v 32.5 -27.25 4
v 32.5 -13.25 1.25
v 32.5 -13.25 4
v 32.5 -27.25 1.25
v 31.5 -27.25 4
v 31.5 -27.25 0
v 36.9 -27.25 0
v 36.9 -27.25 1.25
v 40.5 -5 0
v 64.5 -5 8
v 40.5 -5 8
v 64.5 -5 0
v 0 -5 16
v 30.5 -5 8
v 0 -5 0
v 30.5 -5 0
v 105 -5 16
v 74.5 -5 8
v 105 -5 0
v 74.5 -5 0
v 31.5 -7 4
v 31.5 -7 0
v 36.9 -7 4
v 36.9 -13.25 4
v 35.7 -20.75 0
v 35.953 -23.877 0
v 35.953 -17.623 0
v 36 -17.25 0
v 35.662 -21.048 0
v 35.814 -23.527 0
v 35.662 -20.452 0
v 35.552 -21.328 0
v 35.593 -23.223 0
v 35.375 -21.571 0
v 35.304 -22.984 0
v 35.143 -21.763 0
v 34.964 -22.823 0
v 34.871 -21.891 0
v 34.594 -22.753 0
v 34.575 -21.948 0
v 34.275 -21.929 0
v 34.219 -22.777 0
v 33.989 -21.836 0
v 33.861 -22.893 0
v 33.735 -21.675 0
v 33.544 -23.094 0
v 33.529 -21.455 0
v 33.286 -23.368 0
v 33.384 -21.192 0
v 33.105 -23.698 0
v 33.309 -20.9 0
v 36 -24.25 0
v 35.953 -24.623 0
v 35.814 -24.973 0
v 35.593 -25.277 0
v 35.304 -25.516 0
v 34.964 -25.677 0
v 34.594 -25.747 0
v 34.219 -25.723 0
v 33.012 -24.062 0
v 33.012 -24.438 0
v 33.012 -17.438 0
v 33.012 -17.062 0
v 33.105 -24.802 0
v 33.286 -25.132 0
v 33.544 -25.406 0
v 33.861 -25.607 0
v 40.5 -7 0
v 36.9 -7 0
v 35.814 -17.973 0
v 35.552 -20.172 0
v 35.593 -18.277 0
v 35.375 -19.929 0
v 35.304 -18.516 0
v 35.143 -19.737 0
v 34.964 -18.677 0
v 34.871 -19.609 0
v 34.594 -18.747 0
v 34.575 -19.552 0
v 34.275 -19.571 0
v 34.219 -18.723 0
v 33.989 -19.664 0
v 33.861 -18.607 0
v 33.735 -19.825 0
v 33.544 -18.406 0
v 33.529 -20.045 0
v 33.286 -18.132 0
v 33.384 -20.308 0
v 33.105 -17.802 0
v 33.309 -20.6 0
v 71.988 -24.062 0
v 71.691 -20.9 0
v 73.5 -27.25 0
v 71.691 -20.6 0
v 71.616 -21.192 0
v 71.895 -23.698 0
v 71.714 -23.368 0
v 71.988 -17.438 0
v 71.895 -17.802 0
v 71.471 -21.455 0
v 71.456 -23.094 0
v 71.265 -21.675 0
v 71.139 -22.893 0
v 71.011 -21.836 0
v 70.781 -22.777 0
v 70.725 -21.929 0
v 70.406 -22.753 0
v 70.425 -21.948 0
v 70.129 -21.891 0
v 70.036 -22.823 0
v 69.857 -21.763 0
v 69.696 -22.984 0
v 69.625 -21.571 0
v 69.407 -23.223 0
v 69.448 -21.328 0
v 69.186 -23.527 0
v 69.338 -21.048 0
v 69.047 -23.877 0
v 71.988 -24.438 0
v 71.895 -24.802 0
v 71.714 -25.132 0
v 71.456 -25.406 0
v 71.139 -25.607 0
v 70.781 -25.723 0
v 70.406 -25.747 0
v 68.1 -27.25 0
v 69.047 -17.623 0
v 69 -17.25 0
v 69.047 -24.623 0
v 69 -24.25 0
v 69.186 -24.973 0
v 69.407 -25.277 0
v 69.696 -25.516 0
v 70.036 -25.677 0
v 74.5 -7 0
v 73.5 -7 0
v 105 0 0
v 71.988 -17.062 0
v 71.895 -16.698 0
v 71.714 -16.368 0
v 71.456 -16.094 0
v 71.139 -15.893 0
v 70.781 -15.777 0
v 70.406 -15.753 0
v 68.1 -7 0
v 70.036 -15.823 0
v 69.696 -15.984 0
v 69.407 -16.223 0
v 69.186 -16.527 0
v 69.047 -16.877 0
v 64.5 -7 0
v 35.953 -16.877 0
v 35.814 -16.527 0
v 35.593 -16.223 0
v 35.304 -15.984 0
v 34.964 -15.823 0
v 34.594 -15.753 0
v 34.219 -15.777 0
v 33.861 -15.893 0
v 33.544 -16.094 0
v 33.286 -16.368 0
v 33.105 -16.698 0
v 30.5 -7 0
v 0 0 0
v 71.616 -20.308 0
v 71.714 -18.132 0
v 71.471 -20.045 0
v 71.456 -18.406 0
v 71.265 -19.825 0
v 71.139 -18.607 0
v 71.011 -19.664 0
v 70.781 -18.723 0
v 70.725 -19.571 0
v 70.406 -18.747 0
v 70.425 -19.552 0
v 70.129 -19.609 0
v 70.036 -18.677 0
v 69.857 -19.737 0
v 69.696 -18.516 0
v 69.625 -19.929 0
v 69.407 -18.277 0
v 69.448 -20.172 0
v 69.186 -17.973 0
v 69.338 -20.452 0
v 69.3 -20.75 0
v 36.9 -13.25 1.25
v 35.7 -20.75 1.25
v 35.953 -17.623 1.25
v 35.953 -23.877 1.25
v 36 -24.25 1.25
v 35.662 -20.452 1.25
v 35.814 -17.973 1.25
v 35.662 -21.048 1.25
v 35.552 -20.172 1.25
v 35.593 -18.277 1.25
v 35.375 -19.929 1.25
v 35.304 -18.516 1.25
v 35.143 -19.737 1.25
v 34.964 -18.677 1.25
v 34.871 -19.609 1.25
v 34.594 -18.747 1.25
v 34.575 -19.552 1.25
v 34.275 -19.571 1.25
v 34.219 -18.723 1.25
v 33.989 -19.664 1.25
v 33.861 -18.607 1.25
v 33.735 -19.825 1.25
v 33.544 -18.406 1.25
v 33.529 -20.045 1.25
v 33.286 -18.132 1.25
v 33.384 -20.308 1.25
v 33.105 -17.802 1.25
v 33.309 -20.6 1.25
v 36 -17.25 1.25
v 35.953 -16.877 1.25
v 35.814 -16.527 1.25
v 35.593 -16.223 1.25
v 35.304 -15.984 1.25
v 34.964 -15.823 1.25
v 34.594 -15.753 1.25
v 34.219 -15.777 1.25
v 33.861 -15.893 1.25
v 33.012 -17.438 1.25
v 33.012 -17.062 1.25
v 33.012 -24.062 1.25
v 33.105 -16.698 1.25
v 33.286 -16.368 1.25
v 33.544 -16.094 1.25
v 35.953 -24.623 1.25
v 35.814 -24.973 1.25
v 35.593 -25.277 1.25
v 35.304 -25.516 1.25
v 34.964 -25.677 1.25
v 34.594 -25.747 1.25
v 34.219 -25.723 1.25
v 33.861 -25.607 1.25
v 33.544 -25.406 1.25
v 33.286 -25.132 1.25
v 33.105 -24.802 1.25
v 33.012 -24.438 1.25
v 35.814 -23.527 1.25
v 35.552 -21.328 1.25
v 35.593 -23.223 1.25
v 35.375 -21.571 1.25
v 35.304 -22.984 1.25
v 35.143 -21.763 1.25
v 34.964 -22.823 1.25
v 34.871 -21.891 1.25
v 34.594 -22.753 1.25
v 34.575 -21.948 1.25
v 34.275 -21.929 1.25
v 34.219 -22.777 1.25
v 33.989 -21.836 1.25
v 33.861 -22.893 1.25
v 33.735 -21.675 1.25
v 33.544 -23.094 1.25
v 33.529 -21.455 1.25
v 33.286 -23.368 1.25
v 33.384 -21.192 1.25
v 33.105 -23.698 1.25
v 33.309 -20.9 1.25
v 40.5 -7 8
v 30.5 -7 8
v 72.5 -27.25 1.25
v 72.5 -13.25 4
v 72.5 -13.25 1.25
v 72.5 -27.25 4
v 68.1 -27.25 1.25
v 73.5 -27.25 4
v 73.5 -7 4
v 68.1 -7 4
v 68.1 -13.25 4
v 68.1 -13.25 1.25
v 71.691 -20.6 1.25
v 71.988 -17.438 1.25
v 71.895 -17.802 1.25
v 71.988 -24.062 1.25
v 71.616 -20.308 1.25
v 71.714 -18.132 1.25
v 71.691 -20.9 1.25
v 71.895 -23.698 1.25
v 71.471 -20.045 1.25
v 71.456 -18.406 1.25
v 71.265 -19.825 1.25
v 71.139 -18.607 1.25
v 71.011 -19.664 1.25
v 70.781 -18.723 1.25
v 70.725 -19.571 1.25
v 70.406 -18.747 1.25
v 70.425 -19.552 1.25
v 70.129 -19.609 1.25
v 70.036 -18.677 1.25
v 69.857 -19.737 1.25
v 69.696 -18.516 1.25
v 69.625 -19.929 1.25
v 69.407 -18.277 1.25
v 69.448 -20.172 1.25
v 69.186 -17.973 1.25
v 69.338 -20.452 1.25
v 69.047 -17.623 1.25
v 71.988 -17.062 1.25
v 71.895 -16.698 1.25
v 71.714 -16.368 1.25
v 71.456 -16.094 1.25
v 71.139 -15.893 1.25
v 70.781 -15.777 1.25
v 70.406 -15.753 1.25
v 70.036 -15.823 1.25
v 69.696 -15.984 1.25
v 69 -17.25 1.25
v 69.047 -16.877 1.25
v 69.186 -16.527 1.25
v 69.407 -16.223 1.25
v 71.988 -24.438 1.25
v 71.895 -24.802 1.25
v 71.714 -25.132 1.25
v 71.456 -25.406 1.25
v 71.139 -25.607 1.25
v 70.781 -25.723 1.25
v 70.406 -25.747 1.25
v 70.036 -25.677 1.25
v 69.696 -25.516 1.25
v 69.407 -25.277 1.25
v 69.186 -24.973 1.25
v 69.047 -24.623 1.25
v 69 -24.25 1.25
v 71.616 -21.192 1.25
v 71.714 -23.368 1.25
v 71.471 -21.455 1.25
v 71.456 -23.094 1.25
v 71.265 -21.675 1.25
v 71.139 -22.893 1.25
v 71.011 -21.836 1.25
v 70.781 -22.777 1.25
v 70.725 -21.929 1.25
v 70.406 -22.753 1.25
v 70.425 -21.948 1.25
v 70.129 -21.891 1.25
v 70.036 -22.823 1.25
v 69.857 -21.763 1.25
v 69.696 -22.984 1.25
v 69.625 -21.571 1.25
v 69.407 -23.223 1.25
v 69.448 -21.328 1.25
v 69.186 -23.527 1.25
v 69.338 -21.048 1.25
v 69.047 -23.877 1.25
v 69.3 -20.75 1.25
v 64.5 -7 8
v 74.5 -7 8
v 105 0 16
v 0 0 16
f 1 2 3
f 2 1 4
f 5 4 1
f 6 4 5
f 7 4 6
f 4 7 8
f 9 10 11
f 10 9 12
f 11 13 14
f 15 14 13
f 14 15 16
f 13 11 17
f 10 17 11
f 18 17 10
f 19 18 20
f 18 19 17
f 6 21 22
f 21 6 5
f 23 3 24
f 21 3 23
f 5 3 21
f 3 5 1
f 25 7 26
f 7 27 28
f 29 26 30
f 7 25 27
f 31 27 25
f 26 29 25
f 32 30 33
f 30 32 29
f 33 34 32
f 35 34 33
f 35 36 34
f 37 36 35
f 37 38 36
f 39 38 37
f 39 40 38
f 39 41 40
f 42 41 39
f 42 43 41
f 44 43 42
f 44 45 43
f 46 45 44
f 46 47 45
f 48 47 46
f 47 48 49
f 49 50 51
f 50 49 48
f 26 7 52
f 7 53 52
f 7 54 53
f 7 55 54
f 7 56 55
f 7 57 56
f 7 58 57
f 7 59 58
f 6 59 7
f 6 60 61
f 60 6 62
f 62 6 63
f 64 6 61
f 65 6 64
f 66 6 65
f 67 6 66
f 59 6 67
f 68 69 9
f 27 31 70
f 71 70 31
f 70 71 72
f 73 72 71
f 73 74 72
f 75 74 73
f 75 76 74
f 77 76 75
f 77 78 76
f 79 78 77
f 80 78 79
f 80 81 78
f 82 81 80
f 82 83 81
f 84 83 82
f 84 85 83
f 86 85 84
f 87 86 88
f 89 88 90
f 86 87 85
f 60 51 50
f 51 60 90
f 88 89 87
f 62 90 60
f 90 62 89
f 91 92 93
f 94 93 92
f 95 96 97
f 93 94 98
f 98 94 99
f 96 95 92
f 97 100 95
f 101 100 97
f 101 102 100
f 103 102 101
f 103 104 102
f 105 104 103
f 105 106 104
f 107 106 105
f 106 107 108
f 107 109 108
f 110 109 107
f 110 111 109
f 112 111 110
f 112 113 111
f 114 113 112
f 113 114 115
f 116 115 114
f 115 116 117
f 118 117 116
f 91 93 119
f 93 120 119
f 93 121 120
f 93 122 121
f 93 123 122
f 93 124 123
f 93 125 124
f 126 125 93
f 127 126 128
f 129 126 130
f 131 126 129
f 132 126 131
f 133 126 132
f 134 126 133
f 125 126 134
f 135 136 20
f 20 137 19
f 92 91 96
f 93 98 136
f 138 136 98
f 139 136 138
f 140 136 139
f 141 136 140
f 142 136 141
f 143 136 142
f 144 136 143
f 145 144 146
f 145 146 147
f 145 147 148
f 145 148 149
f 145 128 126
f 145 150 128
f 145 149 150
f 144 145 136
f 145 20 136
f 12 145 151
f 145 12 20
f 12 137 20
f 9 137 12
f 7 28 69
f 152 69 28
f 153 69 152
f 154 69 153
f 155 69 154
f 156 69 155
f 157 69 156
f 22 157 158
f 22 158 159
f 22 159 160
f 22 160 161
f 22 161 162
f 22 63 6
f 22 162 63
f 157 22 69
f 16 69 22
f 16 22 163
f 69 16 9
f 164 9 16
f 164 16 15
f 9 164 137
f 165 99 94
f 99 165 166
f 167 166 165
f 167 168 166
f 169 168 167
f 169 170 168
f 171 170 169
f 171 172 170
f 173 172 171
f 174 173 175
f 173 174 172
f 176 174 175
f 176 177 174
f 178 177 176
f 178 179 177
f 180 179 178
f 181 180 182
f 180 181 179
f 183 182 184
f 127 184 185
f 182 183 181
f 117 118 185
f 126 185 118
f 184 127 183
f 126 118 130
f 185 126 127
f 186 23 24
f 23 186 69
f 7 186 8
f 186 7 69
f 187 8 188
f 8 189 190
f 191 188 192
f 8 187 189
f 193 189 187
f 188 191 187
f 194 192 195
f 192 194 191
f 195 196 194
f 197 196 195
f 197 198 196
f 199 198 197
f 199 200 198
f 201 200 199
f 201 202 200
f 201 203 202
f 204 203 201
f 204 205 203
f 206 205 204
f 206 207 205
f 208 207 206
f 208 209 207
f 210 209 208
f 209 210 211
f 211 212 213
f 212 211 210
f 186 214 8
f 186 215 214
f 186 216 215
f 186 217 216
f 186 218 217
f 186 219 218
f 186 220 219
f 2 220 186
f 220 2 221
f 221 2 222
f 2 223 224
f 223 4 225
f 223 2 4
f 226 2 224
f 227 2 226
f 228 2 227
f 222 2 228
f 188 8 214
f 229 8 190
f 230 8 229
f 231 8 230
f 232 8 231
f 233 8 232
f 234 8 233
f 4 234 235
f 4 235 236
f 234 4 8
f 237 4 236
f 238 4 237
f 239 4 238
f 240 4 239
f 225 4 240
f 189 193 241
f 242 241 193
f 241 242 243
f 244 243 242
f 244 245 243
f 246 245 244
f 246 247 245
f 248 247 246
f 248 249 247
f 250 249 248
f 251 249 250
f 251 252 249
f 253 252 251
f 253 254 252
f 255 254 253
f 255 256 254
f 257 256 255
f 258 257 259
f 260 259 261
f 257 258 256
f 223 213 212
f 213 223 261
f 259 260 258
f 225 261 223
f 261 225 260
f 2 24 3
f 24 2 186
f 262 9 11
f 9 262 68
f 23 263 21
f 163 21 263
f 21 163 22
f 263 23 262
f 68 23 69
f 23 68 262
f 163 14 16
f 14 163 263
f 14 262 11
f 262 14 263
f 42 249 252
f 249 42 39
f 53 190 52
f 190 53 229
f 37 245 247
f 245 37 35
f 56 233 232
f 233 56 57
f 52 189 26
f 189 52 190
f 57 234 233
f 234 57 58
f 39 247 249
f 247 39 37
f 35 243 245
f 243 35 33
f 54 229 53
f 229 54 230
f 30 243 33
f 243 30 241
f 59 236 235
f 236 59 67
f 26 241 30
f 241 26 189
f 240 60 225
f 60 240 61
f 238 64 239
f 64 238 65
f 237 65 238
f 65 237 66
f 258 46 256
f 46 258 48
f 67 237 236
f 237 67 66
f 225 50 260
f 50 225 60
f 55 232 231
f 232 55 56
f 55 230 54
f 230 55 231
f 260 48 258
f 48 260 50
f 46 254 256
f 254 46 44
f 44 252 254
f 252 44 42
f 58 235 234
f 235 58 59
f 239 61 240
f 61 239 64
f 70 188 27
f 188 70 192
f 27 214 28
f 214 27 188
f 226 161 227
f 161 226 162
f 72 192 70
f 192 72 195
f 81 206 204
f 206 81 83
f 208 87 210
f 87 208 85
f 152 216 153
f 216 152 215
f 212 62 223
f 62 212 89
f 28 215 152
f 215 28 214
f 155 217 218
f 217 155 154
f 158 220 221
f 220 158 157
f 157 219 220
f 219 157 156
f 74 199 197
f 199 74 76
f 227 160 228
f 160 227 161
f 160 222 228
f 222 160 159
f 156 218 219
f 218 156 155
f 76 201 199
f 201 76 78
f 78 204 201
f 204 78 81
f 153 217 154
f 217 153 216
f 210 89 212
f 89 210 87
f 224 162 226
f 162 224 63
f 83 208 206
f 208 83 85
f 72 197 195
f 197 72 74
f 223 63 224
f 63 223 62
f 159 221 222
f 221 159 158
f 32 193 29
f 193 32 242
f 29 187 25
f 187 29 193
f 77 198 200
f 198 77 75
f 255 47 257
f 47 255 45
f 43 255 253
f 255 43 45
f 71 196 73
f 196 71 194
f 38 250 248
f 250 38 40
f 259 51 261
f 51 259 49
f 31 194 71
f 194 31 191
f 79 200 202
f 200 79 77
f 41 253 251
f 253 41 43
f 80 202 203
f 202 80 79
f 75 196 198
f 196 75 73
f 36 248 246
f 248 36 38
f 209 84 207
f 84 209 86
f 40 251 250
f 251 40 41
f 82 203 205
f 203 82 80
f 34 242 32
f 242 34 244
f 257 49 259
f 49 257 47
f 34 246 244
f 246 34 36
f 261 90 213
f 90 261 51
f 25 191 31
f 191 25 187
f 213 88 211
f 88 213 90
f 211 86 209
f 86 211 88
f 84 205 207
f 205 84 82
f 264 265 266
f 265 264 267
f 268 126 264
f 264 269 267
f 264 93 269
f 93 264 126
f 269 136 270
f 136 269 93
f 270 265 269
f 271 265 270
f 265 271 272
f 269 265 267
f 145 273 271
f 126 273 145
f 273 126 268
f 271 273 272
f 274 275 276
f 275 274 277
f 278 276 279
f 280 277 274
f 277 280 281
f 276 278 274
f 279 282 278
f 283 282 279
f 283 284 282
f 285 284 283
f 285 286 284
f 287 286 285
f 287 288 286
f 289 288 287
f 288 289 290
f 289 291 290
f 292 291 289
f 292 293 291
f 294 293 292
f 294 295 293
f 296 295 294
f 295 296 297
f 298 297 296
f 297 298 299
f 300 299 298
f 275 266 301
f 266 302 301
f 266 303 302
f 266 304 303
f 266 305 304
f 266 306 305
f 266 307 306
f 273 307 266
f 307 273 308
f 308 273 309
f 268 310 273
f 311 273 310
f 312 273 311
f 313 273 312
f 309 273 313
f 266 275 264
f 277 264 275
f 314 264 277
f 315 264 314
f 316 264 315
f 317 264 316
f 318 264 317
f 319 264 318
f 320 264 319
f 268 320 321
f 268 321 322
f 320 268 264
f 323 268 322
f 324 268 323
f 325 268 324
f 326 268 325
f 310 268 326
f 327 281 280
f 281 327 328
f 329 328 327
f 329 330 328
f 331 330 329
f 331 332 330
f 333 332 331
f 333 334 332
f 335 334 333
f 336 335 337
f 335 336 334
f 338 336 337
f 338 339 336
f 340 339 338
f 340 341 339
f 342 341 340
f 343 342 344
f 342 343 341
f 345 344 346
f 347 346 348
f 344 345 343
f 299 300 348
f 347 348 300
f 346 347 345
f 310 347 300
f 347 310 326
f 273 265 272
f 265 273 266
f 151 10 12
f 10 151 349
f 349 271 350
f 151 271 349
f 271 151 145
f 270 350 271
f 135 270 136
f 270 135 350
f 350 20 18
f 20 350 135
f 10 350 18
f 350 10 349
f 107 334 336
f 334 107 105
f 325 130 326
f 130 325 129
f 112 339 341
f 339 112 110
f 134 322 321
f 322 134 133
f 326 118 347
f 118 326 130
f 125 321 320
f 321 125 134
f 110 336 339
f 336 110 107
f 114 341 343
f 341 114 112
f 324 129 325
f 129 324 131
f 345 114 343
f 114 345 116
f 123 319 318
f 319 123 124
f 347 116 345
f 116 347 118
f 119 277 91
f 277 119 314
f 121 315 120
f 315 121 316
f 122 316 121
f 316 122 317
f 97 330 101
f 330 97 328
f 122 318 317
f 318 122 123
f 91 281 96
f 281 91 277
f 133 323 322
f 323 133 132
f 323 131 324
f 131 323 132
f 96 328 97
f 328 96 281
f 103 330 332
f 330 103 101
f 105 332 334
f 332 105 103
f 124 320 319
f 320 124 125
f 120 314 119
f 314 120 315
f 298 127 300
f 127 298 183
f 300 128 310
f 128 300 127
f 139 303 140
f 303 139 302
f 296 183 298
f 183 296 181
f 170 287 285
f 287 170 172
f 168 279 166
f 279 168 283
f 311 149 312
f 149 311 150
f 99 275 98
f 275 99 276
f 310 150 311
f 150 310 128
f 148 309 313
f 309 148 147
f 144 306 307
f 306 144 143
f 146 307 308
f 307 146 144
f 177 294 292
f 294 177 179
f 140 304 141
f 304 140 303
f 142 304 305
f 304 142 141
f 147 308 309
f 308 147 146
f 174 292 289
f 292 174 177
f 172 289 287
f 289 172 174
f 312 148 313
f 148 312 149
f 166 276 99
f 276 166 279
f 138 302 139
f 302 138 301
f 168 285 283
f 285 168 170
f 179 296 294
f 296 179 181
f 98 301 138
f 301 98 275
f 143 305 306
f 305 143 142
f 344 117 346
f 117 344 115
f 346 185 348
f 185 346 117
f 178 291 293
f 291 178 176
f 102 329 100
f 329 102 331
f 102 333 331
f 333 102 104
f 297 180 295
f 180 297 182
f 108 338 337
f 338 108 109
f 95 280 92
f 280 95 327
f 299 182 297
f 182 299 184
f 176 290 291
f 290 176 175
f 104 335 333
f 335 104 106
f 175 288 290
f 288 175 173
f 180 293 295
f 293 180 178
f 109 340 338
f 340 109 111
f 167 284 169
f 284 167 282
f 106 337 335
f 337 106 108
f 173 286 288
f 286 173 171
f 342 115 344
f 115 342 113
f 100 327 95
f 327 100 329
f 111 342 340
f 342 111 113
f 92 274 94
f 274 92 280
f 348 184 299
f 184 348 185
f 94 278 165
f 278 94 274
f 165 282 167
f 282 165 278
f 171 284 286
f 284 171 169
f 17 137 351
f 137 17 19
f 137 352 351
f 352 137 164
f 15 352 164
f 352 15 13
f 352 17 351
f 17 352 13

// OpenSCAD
side = 1;
sideb = 1.25;

width = 5;
length = 4;
boostheight=8.25;
height = 14;

screwhole=1.5;
minihole=1.2;

postspacing=42;

blockwidth=105;
blocklength=16;
blockheight = 5;

m3hole = 1.8;
m3postsize=10;
m3postheight=20;

rotate([90,0,0]){

difference(){

union(){
cube([blockwidth,blocklength,blockheight]);

//translate([0,0,-m3postheight])
//cube([m3postsize,m3postsize,m3postheight]);

//translate([blockwidth-m3postsize,0,-m3postheight])
//cube([m3postsize,m3postsize,m3postheight]);

translate([(blockwidth-postspacing)/2,0,blockheight]){
post();

translate([postspacing,0,0])
mirror([1,0,0])
post();
}
}

//m3 screws
//translate([m3postsize/2,m3postsize/2,-m3postheight-1])
//rotate([0,-90,-90])
//#teardrop(m3hole, m3postheight*4, 90);

//translate([m3postsize/2+blockwidth-m3postsize,m3postsize/2,-m3postheight-1])
//rotate([0,-90,-90])
//#teardrop(m3hole, m3postheight*4, 90);

}
}



module post(){
totalheight = height+boostheight;
extra_tune_space = 0.4;

difference(){

union(){
cube([side, length, totalheight]);
cube([width+extra_tune_space, sideb, totalheight]);
cube([width+extra_tune_space, length, boostheight]);
translate([-1,0,0])
cube([width*2, length*2, 2]);
}

rotate([90,0,0])
translate([width/2+side/2,totalheight-screwhole-1.5,-side-1])
cylinder(r=screwhole,h=side+3, $fn=25);

rotate([90,0,0])
translate([width/2+side/2,totalheight-screwhole-1.5-7,-side-1])
cylinder(r=screwhole,h=side+3, $fn=25);

rotate([90,0,0])
translate([width/2+side/2,totalheight-minihole-1.5-3.5-(screwhole-minihole),-side-1])
cylinder(r=minihole,h=side+3, $fn=25);

}
}

module teardrop(radius, length, angle) {
	rotate([0, angle, 0]) union() {
		linear_extrude(height = length, center = true, convexity = radius, twist = 0)
			circle(r = radius, center = true, $fn = 30);
		linear_extrude(height = length, center = true, convexity = radius, twist = 0)
			projection(cut = false) rotate([0, -angle, 0]) translate([0, 0, radius * sin(45) * 1.5]) cylinder(h = radius * sin(45), r1 = radius * sin(45), r2 = 0, center = true, $fn = 30);
	}
}
